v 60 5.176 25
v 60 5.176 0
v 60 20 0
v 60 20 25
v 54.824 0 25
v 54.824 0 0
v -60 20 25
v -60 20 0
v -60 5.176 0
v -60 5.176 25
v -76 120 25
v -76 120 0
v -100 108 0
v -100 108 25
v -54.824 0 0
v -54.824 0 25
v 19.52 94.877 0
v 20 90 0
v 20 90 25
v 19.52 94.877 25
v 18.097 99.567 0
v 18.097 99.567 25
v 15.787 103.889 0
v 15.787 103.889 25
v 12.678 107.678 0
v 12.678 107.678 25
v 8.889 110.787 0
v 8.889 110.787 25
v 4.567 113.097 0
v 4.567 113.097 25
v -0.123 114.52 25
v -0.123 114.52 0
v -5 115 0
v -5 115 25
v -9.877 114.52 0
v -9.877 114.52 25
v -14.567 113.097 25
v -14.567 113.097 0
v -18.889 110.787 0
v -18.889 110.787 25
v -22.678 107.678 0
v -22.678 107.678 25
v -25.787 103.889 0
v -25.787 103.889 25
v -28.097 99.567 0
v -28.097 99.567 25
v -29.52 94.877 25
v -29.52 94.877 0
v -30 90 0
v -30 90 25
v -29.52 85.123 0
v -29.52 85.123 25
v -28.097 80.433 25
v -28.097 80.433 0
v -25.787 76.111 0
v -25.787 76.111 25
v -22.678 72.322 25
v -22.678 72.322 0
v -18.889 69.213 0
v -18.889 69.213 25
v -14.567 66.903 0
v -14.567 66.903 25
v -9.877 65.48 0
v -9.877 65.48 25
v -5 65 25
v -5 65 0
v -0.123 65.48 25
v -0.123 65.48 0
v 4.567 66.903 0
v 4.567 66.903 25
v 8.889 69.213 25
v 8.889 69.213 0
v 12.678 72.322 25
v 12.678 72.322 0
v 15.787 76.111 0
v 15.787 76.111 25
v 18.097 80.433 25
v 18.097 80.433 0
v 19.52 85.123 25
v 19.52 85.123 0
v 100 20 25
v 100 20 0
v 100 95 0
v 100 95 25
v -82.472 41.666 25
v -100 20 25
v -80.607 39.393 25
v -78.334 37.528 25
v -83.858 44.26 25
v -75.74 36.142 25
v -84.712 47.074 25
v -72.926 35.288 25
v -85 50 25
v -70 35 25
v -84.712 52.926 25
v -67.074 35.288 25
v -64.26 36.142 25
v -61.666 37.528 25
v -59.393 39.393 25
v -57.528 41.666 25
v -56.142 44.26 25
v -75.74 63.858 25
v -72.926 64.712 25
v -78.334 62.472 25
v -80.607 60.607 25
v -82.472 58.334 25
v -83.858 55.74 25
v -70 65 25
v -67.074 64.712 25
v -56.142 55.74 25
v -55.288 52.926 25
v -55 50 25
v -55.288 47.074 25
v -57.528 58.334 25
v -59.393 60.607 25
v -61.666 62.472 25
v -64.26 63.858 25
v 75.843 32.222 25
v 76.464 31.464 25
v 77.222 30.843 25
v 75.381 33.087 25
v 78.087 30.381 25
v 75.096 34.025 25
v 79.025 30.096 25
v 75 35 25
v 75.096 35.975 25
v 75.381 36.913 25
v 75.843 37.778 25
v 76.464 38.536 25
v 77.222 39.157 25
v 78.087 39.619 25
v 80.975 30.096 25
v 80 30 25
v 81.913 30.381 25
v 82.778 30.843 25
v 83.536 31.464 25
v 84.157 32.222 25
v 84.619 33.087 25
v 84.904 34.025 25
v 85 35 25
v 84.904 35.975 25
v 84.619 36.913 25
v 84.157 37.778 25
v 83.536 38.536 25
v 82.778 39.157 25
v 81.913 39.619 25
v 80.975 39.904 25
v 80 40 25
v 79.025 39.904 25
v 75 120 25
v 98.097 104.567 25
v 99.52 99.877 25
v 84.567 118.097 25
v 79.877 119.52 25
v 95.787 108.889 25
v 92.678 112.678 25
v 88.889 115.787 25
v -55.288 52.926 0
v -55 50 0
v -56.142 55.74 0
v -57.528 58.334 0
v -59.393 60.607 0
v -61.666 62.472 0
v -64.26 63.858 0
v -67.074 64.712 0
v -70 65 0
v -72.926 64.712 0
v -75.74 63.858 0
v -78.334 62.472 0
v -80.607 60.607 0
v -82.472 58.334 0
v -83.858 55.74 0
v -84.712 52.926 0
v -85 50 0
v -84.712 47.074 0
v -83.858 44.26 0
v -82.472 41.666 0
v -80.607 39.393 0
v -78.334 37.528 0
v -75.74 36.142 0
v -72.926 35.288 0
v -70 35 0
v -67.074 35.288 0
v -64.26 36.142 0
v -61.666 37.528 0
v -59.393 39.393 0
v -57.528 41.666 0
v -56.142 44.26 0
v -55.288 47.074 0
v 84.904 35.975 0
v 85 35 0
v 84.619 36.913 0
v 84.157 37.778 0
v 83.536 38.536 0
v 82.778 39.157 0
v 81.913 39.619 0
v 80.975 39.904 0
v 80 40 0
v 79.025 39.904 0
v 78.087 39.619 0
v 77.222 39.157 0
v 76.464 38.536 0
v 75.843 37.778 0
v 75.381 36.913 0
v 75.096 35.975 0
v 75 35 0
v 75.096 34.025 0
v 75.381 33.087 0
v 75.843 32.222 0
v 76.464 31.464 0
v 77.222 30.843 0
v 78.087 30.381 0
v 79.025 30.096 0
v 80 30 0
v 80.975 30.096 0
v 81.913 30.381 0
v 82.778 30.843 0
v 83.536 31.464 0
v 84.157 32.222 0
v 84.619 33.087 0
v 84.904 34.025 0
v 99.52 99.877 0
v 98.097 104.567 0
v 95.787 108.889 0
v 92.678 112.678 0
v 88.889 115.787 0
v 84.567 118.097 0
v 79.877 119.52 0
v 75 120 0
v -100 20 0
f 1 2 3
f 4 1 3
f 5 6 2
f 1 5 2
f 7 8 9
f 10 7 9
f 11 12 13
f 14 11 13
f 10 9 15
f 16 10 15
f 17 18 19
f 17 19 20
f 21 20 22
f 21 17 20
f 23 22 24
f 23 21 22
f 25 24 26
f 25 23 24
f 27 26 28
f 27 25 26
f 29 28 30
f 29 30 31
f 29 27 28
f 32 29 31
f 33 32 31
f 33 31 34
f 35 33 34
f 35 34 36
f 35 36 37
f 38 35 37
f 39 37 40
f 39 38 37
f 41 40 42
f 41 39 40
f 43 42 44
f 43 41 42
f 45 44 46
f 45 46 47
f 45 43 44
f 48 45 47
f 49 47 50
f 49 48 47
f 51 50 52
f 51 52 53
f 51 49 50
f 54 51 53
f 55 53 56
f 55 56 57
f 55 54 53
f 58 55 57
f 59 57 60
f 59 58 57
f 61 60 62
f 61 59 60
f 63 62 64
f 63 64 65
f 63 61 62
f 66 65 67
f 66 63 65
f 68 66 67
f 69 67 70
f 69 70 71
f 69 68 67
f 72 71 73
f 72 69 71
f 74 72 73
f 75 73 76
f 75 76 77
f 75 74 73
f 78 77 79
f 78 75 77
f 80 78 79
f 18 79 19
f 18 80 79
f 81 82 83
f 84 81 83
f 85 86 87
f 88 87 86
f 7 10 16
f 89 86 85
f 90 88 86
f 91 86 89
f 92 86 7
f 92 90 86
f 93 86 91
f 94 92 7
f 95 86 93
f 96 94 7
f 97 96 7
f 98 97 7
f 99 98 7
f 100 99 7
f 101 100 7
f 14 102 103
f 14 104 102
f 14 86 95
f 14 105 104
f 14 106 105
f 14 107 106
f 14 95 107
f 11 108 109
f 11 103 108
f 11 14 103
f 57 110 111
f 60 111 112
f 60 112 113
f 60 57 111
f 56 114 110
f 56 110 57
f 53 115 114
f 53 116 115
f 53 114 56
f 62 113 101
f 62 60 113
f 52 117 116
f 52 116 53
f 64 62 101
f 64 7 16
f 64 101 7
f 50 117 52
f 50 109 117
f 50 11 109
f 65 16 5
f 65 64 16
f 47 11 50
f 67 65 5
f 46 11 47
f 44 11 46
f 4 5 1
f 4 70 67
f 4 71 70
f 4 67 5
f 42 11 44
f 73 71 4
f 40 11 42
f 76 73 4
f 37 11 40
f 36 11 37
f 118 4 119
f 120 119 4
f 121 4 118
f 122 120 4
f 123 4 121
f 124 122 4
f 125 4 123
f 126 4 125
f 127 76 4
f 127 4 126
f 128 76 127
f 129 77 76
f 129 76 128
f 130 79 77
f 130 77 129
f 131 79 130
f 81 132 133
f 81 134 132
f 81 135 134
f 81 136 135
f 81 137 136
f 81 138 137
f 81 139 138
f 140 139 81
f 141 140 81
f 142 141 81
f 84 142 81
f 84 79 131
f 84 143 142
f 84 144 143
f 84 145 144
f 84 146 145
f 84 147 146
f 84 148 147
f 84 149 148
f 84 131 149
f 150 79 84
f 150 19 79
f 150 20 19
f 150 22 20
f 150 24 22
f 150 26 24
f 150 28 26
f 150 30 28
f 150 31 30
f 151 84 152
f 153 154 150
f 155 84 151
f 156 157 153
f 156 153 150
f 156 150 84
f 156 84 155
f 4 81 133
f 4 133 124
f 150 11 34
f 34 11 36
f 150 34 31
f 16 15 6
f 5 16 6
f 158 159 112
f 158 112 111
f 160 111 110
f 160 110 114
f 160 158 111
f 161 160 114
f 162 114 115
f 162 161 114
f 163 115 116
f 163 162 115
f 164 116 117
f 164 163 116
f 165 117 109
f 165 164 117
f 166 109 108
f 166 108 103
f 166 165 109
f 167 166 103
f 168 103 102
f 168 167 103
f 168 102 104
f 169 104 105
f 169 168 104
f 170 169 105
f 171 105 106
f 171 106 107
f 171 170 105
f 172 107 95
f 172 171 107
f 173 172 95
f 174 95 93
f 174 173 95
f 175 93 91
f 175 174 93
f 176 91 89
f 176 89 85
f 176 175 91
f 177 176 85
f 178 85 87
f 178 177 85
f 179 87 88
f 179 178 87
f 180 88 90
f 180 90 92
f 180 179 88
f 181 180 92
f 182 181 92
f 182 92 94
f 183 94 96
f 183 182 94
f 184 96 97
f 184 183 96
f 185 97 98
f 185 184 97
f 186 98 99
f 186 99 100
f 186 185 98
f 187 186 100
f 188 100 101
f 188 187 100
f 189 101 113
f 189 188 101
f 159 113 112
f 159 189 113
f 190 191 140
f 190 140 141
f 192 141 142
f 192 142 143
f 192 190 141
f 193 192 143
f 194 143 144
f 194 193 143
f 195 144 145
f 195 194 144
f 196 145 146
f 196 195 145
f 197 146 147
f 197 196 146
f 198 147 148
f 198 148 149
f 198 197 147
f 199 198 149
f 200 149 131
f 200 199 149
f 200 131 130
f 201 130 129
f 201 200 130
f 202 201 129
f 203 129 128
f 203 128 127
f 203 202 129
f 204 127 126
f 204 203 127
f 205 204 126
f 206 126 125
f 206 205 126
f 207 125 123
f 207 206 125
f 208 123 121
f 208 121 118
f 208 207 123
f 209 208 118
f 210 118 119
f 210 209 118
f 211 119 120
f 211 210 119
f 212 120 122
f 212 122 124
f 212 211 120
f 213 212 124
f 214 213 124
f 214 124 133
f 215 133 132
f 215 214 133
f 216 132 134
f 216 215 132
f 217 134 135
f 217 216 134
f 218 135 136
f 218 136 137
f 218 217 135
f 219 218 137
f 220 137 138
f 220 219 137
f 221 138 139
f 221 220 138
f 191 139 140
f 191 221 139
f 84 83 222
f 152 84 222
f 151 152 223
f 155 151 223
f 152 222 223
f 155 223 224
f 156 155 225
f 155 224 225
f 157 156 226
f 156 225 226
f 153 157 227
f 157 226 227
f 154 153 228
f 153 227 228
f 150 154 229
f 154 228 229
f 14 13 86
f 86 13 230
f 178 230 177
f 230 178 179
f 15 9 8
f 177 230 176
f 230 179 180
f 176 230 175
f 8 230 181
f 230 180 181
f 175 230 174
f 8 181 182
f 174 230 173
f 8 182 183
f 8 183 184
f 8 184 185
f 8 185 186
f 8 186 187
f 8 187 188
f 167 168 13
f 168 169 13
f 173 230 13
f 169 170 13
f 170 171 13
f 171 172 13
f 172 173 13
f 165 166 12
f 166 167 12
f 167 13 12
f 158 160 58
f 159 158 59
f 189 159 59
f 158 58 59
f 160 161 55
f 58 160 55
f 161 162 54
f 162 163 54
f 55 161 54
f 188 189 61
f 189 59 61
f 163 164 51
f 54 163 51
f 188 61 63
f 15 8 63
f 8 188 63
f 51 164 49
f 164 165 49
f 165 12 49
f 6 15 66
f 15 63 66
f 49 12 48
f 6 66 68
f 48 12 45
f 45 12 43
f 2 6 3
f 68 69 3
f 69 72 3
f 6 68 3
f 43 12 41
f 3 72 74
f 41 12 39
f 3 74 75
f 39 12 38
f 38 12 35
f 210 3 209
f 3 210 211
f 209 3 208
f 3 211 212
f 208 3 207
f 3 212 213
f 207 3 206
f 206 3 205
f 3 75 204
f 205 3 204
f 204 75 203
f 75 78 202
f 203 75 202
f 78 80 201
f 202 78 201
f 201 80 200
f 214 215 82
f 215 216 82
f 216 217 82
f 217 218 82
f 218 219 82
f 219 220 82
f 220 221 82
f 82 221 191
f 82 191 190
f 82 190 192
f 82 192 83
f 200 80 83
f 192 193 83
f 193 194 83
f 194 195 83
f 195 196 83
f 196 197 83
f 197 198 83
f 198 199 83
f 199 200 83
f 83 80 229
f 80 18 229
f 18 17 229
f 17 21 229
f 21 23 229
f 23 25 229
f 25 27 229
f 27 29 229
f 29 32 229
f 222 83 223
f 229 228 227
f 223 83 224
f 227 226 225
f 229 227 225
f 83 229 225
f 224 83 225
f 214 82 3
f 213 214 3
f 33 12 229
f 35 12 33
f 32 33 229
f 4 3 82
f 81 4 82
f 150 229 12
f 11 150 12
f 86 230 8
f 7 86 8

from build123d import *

# Parameters (mm, degrees)
F0_R     = 15
F0_R_2   = 5
F0_R_3   = 25
F1_DEPTH = 25


with BuildPart() as f1:
    # F0 (on Top) → F1 (new body)
    with BuildSketch(Plane.XY):
        with BuildLine():
            Line((-54.824, 0), (0, 0))
            Line((0, 0), (54.824, 0))
            Line((54.824, 0), (60, 5.17583))
            Line((60, 5.17583), (60, 20))
            Line((60, 20), (100, 20))
            Line((100, 20), (100, 35))
            Line((100, 35), (100, 95))
            ThreePointArc((100, 95), (92.67767, 112.67767), (75, 120))
            Line((75, 120), (-5, 120))
            Line((-5, 120), (-76, 120))
            Line((-76, 120), (-100, 108))
            Line((-100, 108), (-100, 20))
            Line((-100, 20), (-70, 20))
            Line((-70, 20), (-60, 20))
            Line((-60, 20), (-60, 5.176))
            Line((-60, 5.176), (-54.824, 0))
        make_face()
        with Locations((-70, 50)):
            Circle(F0_R, mode=Mode.SUBTRACT)
        with Locations((80, 35)):
            Circle(F0_R_2, mode=Mode.SUBTRACT)
        with Locations((-5, 90)):
            Circle(F0_R_3, mode=Mode.SUBTRACT)
    extrude(amount=F1_DEPTH)


solid = f1.part
